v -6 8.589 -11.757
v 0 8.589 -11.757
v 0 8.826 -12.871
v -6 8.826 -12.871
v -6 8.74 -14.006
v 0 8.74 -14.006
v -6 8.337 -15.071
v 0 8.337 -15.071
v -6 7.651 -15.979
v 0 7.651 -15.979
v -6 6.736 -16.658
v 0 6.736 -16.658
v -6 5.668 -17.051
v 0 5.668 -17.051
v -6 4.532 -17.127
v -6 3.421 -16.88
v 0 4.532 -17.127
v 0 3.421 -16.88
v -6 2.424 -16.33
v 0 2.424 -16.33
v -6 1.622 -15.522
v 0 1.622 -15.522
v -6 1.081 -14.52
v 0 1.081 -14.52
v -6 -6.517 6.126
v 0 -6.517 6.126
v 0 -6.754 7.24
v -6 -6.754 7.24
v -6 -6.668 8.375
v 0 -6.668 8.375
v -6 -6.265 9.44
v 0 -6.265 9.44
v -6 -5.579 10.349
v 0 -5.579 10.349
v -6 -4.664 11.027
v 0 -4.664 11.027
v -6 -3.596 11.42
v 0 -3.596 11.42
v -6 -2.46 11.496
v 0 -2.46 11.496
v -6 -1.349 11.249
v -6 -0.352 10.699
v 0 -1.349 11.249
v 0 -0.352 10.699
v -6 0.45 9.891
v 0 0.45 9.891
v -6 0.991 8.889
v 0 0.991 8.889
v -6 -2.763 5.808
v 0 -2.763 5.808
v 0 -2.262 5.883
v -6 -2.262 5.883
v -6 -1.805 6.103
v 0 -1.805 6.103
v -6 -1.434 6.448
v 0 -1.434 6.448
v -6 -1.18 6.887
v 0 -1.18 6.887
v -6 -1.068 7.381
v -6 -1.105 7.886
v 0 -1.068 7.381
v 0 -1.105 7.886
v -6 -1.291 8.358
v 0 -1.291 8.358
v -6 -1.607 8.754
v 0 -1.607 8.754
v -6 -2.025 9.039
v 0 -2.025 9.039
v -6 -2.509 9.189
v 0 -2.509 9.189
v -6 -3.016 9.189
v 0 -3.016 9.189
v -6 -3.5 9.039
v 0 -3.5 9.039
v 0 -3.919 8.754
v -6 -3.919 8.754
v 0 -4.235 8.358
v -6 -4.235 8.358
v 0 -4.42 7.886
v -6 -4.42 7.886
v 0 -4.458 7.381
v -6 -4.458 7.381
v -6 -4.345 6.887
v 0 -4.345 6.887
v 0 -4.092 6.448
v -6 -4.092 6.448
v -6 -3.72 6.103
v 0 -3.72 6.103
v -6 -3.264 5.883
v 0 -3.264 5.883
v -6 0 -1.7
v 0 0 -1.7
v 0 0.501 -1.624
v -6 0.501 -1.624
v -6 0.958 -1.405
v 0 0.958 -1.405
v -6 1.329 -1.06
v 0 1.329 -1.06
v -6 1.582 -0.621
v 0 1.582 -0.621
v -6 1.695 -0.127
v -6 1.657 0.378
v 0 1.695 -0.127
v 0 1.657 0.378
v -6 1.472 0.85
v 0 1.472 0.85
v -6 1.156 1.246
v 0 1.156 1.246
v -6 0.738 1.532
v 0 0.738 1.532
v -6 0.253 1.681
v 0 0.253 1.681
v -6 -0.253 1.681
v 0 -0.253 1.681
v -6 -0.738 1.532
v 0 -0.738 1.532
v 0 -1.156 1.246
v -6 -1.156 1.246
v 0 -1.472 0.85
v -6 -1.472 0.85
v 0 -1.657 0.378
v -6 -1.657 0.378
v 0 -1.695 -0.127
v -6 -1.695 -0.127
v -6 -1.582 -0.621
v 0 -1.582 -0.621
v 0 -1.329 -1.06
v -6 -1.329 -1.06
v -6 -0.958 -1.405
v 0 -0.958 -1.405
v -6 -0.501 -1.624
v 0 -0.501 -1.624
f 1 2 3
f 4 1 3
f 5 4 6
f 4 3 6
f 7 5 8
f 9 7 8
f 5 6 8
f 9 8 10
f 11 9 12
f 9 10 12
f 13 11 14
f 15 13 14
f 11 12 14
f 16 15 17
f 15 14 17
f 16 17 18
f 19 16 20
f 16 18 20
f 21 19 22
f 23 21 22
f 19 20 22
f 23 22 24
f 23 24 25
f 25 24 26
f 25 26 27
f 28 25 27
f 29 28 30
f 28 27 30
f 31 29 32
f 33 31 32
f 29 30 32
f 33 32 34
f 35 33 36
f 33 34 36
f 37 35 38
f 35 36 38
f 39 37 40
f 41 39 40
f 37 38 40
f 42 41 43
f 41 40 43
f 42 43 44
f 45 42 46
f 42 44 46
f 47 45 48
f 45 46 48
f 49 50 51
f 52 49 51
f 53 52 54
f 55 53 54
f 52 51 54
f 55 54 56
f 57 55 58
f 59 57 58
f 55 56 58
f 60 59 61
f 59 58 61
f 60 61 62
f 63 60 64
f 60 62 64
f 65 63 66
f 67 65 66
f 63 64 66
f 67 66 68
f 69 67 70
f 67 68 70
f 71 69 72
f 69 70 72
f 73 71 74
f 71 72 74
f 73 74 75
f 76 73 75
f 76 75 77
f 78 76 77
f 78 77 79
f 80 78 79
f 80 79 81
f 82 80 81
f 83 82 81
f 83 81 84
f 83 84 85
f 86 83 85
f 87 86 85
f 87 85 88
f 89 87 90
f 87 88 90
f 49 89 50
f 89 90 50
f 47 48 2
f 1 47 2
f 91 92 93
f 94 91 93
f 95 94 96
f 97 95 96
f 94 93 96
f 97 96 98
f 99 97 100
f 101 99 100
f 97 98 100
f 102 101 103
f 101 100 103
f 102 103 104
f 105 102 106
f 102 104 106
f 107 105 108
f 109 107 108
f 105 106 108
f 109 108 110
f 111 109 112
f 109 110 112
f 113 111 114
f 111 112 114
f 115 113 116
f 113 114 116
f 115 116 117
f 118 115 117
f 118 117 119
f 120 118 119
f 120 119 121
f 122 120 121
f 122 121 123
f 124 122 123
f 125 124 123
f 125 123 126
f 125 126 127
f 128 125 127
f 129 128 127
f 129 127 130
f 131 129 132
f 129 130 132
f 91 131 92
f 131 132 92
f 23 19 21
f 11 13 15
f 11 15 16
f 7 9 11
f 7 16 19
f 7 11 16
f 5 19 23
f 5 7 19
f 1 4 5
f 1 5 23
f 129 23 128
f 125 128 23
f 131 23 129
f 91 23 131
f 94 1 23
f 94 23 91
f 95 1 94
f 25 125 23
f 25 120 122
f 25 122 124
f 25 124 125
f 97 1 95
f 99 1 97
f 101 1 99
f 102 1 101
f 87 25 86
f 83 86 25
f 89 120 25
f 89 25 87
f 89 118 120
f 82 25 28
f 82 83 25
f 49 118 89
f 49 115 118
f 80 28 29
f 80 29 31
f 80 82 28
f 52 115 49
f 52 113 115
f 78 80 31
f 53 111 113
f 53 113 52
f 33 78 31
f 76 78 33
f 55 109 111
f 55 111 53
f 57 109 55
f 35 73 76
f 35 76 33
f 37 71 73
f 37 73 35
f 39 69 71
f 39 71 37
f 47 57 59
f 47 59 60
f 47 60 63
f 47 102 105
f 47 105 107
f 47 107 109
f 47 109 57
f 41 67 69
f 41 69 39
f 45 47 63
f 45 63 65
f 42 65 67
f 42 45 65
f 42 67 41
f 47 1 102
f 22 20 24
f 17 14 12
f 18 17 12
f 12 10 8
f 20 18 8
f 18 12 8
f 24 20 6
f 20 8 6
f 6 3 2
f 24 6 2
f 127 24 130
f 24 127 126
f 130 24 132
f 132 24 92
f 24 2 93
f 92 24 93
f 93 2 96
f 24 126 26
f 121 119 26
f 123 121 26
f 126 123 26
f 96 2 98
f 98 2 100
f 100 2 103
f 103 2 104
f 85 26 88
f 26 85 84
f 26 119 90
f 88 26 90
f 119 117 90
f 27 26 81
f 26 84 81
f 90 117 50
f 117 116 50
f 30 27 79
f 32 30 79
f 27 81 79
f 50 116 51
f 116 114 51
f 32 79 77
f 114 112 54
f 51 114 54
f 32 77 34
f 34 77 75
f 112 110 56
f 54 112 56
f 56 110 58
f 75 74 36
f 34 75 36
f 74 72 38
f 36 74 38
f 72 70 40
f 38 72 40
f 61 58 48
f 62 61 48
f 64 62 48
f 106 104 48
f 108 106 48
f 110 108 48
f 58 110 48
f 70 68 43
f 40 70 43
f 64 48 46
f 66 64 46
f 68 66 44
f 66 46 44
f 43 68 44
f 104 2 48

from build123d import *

# Parameters (mm, degrees)
SKETCH1_R           = 1.7
BOSS_EXTRUDE1_DEPTH = 6


with BuildPart() as part:
    # Sketch1 → Boss-Extrude1 (new body)
    with BuildSketch(Plane(origin=(0, 0, 0), x_dir=(0, 0, -1), z_dir=(1, 0, 0))):
        with BuildLine():
            Line((14.520034317, 1.08101962), (-6.126384754, -6.516702375))
            ThreePointArc((-6.126384754, -6.516702375), (-11.26168313, -4.144211997), (-8.889192752, 0.991086378))
            Line((-8.889192752, 0.991086378), (11.757226319, 8.588808374))
            ThreePointArc((11.757226319, 8.588808374), (16.892524695, 6.216317996), (14.520034317, 1.08101962))
        make_face()
        Circle(SKETCH1_R, mode=Mode.SUBTRACT)
        with Locations((-7.507788753, -2.762807998)):
            Circle(SKETCH1_R, mode=Mode.SUBTRACT)
    extrude(amount=-BOSS_EXTRUDE1_DEPTH)


solid = part.part
